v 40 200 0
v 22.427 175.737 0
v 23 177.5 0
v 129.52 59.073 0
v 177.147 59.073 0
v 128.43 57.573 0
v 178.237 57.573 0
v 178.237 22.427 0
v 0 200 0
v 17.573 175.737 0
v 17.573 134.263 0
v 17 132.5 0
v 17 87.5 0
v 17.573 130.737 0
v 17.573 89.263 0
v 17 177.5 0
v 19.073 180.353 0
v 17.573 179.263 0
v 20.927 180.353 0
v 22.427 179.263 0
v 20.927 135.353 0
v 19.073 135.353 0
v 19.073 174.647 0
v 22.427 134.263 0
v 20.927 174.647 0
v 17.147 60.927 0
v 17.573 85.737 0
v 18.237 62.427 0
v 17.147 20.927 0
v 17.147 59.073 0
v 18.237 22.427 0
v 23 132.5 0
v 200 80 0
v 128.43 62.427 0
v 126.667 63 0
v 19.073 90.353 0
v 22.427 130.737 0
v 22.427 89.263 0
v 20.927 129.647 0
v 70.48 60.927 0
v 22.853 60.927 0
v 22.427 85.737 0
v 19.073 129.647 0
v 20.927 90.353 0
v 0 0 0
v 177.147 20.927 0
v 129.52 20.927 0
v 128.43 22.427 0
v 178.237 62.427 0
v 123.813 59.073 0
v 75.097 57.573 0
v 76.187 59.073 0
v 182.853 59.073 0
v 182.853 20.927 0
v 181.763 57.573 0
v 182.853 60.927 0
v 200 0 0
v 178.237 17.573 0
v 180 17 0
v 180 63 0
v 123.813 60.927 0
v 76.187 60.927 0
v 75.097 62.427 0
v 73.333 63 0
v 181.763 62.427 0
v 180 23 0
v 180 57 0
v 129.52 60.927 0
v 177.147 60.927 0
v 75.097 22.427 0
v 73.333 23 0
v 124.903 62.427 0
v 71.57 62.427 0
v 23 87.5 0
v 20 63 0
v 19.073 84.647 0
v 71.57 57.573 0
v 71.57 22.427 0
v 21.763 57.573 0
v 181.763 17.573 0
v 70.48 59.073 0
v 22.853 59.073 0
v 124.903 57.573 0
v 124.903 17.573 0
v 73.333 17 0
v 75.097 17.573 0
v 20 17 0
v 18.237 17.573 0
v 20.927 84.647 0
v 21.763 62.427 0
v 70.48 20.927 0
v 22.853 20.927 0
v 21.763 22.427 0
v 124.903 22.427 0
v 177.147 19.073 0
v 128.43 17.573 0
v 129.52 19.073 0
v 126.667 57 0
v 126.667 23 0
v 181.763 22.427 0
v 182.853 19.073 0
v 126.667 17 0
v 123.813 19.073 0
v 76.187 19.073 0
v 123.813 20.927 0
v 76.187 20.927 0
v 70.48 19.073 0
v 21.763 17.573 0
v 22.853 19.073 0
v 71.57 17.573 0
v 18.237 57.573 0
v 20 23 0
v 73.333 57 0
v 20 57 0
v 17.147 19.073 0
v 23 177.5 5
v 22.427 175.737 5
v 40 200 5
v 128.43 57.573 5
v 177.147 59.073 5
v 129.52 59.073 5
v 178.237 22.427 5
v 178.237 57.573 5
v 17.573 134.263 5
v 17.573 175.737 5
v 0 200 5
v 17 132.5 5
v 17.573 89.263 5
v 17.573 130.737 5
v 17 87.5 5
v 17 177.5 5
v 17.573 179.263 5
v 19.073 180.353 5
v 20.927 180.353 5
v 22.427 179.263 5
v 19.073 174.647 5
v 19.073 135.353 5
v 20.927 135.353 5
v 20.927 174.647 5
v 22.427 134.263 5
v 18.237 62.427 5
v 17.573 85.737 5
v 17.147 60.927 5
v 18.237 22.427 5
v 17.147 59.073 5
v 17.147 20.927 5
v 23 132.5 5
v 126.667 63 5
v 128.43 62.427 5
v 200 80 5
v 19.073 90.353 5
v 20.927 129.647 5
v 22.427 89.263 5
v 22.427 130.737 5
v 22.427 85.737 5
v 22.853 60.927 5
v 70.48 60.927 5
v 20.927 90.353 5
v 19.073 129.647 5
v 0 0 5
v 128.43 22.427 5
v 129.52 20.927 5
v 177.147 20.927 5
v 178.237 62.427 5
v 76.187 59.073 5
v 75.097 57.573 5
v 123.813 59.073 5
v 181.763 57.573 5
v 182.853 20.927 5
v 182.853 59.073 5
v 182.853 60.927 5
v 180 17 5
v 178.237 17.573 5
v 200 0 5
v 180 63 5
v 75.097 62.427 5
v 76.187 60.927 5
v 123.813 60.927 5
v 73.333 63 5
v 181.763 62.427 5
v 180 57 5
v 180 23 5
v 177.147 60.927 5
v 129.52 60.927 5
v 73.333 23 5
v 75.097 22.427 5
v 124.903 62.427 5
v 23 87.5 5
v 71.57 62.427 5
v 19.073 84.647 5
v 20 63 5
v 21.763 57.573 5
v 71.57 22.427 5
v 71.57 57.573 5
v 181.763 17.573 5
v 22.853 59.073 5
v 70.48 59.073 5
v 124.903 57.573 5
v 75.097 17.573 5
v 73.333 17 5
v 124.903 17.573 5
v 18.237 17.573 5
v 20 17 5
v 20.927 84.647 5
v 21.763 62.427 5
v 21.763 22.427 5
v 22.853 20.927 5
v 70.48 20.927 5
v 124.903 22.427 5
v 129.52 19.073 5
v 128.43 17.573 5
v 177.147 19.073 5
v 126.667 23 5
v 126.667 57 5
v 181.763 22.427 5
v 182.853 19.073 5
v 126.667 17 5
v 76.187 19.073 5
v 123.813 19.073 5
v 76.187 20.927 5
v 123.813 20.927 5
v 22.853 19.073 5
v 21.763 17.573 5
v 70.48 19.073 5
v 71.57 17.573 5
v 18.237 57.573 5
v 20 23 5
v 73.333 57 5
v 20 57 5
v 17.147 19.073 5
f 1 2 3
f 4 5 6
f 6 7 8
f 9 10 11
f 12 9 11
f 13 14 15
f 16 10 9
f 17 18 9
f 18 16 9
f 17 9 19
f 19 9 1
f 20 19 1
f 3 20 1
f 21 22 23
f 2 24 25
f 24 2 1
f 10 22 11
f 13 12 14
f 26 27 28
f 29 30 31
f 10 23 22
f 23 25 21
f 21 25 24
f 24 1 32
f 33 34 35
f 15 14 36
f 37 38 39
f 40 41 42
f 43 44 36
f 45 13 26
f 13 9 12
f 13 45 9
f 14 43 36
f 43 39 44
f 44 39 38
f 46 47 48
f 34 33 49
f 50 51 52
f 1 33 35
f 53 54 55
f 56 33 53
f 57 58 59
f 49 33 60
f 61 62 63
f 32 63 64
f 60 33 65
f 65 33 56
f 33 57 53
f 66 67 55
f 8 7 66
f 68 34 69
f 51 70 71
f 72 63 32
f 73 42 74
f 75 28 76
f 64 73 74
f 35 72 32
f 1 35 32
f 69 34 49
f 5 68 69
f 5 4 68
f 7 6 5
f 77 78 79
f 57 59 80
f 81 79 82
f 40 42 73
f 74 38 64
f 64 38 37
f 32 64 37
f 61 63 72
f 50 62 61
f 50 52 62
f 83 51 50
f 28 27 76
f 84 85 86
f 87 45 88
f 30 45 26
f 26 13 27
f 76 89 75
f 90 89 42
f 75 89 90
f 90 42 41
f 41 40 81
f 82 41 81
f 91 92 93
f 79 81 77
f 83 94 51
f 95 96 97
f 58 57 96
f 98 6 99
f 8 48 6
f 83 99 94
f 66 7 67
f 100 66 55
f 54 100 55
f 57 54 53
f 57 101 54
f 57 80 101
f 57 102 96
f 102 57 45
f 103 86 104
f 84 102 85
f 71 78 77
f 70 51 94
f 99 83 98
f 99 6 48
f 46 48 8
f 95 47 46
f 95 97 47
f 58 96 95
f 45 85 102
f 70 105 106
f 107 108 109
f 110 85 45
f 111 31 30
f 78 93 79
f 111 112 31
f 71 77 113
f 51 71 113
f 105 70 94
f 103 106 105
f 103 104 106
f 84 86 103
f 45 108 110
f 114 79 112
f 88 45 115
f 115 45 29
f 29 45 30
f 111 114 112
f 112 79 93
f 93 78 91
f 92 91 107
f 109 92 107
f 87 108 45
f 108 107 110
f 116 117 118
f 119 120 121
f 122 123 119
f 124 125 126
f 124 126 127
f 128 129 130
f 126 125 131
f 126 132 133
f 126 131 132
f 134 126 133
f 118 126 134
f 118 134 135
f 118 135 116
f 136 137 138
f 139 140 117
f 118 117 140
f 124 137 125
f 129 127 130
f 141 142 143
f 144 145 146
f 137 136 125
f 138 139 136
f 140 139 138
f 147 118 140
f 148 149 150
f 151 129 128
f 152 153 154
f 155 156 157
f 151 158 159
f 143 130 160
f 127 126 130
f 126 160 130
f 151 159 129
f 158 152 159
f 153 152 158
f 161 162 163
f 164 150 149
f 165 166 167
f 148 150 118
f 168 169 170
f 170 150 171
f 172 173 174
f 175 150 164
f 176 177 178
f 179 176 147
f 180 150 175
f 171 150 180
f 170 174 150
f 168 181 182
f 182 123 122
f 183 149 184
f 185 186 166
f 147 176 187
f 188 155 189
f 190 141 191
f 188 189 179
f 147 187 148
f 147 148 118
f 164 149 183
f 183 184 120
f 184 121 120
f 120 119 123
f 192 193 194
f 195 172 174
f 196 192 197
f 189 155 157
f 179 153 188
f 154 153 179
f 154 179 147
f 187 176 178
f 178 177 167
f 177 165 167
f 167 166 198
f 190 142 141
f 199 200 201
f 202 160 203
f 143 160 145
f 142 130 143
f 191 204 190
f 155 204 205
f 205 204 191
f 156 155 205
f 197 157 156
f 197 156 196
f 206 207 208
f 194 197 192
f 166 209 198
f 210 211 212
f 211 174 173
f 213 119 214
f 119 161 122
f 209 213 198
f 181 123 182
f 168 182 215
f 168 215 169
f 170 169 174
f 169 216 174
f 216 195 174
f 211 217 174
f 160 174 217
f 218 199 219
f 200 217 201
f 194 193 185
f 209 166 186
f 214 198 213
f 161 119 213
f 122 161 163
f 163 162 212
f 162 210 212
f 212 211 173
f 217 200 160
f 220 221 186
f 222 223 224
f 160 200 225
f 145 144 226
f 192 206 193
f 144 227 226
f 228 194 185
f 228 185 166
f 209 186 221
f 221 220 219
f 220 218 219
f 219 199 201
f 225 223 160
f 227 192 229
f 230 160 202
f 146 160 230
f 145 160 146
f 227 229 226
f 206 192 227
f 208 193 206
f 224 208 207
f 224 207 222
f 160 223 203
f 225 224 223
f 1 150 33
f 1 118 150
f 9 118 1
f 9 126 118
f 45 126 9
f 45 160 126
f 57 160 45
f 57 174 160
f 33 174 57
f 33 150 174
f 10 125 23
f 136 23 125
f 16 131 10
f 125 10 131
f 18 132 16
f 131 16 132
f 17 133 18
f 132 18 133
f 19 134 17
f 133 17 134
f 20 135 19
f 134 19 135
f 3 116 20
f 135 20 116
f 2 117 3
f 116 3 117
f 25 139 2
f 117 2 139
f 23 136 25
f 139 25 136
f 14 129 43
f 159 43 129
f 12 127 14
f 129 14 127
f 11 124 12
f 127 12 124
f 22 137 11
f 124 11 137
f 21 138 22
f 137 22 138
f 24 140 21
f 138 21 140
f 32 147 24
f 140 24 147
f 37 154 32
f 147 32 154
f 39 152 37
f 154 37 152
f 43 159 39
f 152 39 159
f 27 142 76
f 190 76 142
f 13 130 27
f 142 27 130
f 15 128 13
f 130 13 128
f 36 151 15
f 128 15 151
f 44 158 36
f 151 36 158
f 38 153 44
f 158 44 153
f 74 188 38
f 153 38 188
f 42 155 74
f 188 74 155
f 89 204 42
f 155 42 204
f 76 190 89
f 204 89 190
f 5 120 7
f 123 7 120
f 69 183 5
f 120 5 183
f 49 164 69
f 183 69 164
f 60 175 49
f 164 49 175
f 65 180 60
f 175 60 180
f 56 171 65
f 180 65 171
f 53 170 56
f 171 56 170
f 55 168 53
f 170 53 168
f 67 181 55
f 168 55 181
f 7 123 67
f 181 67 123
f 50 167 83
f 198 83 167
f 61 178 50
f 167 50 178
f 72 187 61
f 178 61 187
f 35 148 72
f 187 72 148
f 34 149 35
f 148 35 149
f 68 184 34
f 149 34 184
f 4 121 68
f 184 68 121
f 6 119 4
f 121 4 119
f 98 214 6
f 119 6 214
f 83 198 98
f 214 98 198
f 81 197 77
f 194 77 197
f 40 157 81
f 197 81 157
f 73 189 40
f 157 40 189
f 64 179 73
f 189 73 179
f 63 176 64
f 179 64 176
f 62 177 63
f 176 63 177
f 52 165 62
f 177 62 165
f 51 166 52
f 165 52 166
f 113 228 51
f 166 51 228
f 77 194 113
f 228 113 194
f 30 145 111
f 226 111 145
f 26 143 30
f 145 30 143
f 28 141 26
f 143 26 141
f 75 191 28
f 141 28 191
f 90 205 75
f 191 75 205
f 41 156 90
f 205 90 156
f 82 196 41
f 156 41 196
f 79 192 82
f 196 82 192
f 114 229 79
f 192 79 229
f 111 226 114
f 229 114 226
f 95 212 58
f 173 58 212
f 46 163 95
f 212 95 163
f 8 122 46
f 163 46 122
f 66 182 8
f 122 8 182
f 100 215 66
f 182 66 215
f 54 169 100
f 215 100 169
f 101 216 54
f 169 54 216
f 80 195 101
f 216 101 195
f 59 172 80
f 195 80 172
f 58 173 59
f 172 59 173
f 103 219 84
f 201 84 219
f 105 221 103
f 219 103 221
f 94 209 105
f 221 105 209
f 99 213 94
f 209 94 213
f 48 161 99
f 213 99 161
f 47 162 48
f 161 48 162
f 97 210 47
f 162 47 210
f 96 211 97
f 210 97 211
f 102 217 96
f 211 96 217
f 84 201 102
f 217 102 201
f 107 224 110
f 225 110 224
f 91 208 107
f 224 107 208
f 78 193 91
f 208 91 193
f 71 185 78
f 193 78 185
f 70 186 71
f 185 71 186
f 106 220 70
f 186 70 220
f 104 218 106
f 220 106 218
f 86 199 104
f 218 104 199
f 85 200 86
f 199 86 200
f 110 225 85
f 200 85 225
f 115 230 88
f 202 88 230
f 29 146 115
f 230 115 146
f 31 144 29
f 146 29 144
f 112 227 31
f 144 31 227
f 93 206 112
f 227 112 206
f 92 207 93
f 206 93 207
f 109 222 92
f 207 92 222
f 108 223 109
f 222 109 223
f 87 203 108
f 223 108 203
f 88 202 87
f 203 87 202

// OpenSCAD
// file: bracket.scad
module bracket(h, l, a, b) {
	linear_extrude(h) {
		difference() {
			polygon([[0,0], [l, 0], [l, a], [b, l], [0, l]]);
			children(0);
			rotate([0, 180, -90]) children(1);
		}
	}
}

module bracket_holes(width, length, offset_, diameter, holes, rows=1) {
	between_rows = (width)/(rows);
	between_holes = (length - offset_*2)/(holes);
	wcenter = (width-((rows-1)*between_rows))/2;
	lcenter = (length-((holes-1)*between_holes))/2;
	for (r = [0:rows-1]) {
		row = wcenter + r*between_rows;
		for (i = [0:holes-1]) {
			translate([row, lcenter + i*between_holes]) circle(r=diameter/2);
		}
	}
}
// main file
use <bracket.scad>;

module bracket_4080(h=5, l=200) {
	bracket(h, l, 80, 40) {
		translate([0, 55, 0]) bracket_holes(40, l, 10, 6, 4);
		bracket_holes(80, l, -6.6666, 6, 4, 2);
	}
}

bracket_4080();
